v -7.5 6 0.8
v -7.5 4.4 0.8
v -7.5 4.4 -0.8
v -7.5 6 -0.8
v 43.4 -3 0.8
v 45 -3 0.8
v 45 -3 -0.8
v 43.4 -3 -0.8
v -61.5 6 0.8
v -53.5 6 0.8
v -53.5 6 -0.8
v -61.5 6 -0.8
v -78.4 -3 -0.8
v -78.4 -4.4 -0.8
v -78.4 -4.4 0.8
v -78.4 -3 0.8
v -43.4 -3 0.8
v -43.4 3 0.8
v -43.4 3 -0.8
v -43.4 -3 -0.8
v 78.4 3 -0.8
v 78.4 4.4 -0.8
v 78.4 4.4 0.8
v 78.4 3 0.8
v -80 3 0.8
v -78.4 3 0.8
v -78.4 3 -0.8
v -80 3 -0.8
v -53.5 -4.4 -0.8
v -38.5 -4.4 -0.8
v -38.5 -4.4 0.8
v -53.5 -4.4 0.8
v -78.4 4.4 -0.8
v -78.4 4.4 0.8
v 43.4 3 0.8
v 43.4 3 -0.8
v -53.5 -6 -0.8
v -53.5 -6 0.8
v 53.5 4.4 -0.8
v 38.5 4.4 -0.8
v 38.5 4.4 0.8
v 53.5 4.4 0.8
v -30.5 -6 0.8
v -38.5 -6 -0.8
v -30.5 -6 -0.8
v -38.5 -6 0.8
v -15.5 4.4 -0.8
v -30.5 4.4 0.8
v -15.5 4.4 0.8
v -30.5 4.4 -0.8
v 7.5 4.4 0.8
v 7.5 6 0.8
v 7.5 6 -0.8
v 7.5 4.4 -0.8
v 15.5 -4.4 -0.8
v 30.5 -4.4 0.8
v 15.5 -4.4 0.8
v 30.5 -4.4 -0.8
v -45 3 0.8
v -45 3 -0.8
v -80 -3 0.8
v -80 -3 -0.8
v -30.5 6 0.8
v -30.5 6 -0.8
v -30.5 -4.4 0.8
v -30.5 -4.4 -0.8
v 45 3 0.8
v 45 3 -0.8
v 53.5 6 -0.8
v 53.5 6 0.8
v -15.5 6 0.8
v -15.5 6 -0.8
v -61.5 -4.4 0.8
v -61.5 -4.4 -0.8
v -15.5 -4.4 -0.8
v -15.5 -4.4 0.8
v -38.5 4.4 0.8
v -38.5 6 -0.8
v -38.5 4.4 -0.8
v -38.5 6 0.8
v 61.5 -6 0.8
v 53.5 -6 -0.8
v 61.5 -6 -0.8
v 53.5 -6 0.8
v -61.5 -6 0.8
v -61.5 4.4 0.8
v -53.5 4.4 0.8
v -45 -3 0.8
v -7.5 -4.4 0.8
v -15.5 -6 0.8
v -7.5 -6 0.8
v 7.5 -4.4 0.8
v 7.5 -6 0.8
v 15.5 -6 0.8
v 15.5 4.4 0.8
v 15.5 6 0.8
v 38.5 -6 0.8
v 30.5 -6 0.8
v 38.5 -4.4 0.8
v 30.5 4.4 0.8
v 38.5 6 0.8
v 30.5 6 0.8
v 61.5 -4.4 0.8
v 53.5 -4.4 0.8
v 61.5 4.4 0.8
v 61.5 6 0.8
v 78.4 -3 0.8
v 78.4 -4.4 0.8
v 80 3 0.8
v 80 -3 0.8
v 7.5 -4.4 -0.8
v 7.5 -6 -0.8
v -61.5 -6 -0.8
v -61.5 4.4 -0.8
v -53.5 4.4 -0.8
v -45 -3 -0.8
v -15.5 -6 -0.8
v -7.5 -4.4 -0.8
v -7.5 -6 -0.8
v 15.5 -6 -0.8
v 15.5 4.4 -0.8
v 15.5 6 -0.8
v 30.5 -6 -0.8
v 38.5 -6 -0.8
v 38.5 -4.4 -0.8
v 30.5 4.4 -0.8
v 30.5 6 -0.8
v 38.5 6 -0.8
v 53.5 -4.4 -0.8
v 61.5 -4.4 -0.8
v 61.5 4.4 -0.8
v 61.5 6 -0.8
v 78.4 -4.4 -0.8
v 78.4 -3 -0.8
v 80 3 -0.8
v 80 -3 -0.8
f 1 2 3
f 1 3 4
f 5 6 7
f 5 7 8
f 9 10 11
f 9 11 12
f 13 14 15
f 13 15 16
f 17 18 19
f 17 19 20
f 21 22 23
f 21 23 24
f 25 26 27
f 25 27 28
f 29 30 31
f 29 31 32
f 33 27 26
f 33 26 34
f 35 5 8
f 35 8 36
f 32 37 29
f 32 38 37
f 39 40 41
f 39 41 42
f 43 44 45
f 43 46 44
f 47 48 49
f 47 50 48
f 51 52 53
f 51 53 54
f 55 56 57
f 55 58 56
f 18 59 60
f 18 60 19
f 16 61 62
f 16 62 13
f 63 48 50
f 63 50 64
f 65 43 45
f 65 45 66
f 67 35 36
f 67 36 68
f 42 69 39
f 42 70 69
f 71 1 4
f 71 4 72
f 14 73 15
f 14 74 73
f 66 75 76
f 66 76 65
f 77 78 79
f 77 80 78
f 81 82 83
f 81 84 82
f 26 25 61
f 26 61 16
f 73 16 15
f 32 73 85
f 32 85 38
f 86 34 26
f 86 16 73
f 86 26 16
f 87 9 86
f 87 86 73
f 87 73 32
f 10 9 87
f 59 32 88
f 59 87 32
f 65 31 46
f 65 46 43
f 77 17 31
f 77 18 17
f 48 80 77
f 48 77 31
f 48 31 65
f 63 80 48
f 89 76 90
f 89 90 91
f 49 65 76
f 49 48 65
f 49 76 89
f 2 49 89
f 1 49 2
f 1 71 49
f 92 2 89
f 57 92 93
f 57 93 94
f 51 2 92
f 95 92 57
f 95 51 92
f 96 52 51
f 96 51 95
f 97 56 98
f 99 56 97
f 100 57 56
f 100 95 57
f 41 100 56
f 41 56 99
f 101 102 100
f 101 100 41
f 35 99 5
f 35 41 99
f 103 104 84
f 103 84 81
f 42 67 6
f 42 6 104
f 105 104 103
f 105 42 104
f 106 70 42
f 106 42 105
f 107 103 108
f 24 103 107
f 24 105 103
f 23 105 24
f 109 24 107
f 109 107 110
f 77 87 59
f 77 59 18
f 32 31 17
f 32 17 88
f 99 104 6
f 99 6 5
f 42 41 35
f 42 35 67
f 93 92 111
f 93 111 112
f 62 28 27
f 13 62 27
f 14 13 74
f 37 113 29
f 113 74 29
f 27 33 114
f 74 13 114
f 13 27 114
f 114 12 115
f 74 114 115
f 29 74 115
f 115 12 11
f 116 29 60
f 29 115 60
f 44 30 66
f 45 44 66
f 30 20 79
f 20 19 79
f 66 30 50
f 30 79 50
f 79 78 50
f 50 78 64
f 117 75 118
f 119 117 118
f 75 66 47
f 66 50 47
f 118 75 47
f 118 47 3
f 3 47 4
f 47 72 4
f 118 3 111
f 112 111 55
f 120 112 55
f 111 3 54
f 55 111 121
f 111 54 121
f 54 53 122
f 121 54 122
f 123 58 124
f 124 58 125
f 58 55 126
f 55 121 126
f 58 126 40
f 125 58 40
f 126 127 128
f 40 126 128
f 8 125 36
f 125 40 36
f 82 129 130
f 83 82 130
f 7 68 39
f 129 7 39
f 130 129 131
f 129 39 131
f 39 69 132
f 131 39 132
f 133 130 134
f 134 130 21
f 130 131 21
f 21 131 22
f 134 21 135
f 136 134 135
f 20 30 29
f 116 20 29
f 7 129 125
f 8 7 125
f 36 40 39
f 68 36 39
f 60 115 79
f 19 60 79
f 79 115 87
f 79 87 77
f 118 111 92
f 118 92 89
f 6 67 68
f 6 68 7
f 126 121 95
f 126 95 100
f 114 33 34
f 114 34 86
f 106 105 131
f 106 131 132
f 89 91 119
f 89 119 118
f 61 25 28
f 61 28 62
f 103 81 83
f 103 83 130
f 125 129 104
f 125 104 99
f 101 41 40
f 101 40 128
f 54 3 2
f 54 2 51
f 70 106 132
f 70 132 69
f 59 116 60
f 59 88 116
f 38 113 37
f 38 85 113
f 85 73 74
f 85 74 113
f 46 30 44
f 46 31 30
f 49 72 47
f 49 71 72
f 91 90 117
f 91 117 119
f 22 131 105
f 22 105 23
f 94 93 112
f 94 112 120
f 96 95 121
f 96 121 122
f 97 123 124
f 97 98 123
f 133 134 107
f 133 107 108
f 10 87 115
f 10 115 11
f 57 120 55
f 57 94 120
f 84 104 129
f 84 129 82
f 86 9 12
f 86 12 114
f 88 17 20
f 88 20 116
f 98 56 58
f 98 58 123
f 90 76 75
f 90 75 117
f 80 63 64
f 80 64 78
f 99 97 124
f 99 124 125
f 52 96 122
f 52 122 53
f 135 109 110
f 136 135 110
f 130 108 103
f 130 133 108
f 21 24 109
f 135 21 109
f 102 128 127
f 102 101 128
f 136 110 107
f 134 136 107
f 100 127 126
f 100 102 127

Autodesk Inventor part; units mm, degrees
ref_plane "YZ Plane" through (0, 0, 0) normal (1, 0, 0) x (0, 1, 0)
ref_plane "XZ Plane" through (0, 0, 0) normal (0, 1, 0) x (-1, 0, 0)
ref_plane "XY Plane" through (0, 0, 0) normal (0, 0, 1) x (1, 0, 0)
sketch "Sketch1" plane through (0, 0, 0) normal (0, 0, 1) x (1, 0, 0)
  line L0 (0, 6.16) -> (0, -6.16) construction
  line L1 (-109.76, 0) -> (109.76, 0) construction
  line L2 (78.4, -4.4) -> (-78.4, -4.4)
  line L3 (-78.4, -4.4) -> (-78.4, 4.4)
  line L4 (-78.4, 4.4) -> (78.4, 4.4)
  line L5 (78.4, 4.4) -> (78.4, -4.4)
  line L6 (78.4, -4.4) -> (-78.4, 4.4) construction
  line L7 (-78.4, -4.4) -> (78.4, 4.4) construction
  point P0 (0, 0)
  dimension "d0" = 156.8
  dimension "d1" = 8.8
extrude "Extrusion1" add sketch "Sketch1" along normal mid plane 1.6
sketch "Esquisse3" plane through (0, 0, 0.8) normal (0, 0, 1) x (1, 0, 0)
  line L0 (-78.4, -4.4) -> (78.4, -4.4) construction
  line L1 (78.4, -4.4) -> (78.4, 4.4) construction
  line L2 (78.4, 4.4) -> (-78.4, 4.4) construction
  line L3 (-78.4, 4.4) -> (-78.4, -4.4) construction
  line L4 (-112, 0) -> (112, 0) construction
  line L5 (0, 8.08) -> (0, -6.48) construction
  line L6 (-78.4, 3) -> (-80, 3)
  line L7 (-80, 3) -> (-80, -3)
  line L8 (-80, -3) -> (-78.4, -3)
  line L9 (-78.4, -3) -> (-78.4, 3)
  line L10 (78.4, 3) -> (80, 3)
  line L11 (80, 3) -> (80, -3)
  line L12 (80, -3) -> (78.4, -3)
  line L13 (78.4, -3) -> (78.4, 3)
  point P0 (0, 0)
  dimension "d15" = 1.6
  dimension "d16" = 6
extrude "Extrusion3" add sketch "Esquisse3" against normal blind 1.6
sketch "Esquisse4" plane through (0, 0, 0.8) normal (0, 0, 1) x (1, 0, 0)
  line L0 (80, 3) -> (80, -3) construction
  line L1 (80, -3) -> (78.4, -3) construction
  line L2 (78.4, -3) -> (78.4, -4.4) construction
  line L3 (78.4, -4.4) -> (-78.4, -4.4) construction
  line L4 (-78.4, -4.4) -> (-78.4, -3) construction
  line L5 (-78.4, -3) -> (-80, -3) construction
  line L6 (-80, -3) -> (-80, 3) construction
  line L7 (-80, 3) -> (-78.4, 3) construction
  line L8 (-78.4, 3) -> (-78.4, 4.4) construction
  line L9 (-78.4, 4.4) -> (78.4, 4.4) construction
  line L10 (78.4, 4.4) -> (78.4, 3) construction
  line L11 (78.4, 3) -> (80, 3) construction
  line L12 (-78.4, -4.4) -> (78.4, -4.4) construction
  line L13 (78.4, -4.4) -> (78.4, -3) construction
  line L14 (78.4, -3) -> (80, -3) construction
  line L15 (80, -3) -> (80, 3) construction
  line L16 (80, 3) -> (78.4, 3) construction
  line L17 (78.4, 3) -> (78.4, 4.4) construction
  line L18 (78.4, 4.4) -> (-78.4, 4.4) construction
  line L19 (-78.4, 4.4) -> (-78.4, 3) construction
  line L20 (-78.4, 3) -> (-80, 3) construction
  line L21 (-80, 3) -> (-80, -3) construction
  line L22 (-80, -3) -> (-78.4, -3) construction
  line L23 (-78.4, -3) -> (-78.4, -4.4) construction
  line L24 (0, 8.08) -> (0, -6.48) construction
  line L25 (-112, 0) -> (112, 0) construction
  line L26 (-61.5, 4.4) -> (-53.5, 4.4)
  line L27 (-53.5, 4.4) -> (-53.5, 6)
  line L28 (-53.5, 6) -> (-61.5, 6)
  line L29 (-61.5, 6) -> (-61.5, 4.4)
  line L30 (-30.5, 4.4) -> (-30.5, 6)
  line L31 (-38.5, 4.4) -> (-30.5, 4.4)
  line L32 (-30.5, 6) -> (-38.5, 6)
  line L33 (-38.5, 6) -> (-38.5, 4.4)
  line L34 (-7.5, 4.4) -> (-7.5, 6)
  line L35 (-15.5, 4.4) -> (-7.5, 4.4)
  line L36 (-7.5, 6) -> (-15.5, 6)
  line L37 (-15.5, 6) -> (-15.5, 4.4)
  line L38 (15.5, 4.4) -> (15.5, 6)
  line L39 (7.5, 4.4) -> (15.5, 4.4)
  line L40 (15.5, 6) -> (7.5, 6)
  line L41 (7.5, 6) -> (7.5, 4.4)
  line L42 (38.5, 4.4) -> (38.5, 6)
  line L43 (30.5, 4.4) -> (38.5, 4.4)
  line L44 (38.5, 6) -> (30.5, 6)
  line L45 (30.5, 6) -> (30.5, 4.4)
  line L46 (61.5, 4.4) -> (61.5, 6)
  line L47 (53.5, 4.4) -> (61.5, 4.4)
  line L48 (61.5, 6) -> (53.5, 6)
  line L49 (53.5, 6) -> (53.5, 4.4)
  point P0 (0, 0)
  dimension "d19" = 8
  dimension "d20" = 1.6
  dimension "d23" = 23
extrude "Extrusion4" add sketch "Esquisse4" against normal blind 1.6
mirror "Symétrie2" about plane through (0, 0, 0) normal (0, 1, 0) of "Extrusion4"
sketch "Esquisse5" plane through (0, 0, 0.8) normal (0, 0, 1) x (1, 0, 0)
  line L0 (45, -3) -> (43.4, -3)
  line L1 (43.4, -3) -> (43.4, 3)
  line L2 (43.4, 3) -> (45, 3)
  line L3 (45, 3) -> (45, -3)
  line L4 (-43.4, -3) -> (-45, -3)
  line L5 (-45, -3) -> (-45, 3)
  line L6 (-45, 3) -> (-43.4, 3)
  line L7 (-43.4, 3) -> (-43.4, -3)
  point P0 (0, 0)
extrude "Extrusion5" cut sketch "Esquisse5" against normal blind 1.6
properties part number "CaissonArriere" material "PVC-U"
